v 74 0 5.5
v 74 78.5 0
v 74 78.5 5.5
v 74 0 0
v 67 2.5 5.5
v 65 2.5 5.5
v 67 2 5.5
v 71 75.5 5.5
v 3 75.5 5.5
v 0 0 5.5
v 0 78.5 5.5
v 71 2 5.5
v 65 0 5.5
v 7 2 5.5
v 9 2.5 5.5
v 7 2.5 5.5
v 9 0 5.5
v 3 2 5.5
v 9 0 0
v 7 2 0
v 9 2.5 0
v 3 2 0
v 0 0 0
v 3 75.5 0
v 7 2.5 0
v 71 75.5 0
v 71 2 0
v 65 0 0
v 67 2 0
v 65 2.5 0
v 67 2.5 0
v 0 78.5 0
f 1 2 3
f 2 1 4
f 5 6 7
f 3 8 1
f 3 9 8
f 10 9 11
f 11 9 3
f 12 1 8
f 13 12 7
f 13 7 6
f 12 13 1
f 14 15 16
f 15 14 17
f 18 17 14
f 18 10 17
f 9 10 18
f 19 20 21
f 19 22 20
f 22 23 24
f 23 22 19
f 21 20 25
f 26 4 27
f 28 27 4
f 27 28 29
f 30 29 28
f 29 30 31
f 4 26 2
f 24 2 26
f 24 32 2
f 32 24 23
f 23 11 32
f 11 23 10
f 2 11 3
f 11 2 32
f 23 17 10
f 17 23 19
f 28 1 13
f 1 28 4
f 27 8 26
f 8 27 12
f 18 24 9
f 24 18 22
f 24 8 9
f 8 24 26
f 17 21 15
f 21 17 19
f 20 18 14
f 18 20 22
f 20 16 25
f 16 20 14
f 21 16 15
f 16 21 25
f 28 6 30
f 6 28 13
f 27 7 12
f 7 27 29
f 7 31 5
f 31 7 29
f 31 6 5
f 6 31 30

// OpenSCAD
// Lucas Wilder - Michigan Technological University - EE 4777
// Handle

// Height from bottom of holder to top of handle in mm
handleHeight = 100;

// Number of slides
slides = 15;

actualHeight = handleHeight-21.5;

union()
{
	difference()
	{
		union()
		{
			// Main body
			cube(size = [(4*slides)+14,actualHeight,5.5],
							center = false);
		
		}
	
		// Main cut
		translate([3,-6,0]) 
		cube(size = [(4*slides)+8,actualHeight+3,5.5],
				center = false);	

	}
	
	cube(size = [9,2,5.5]);
	translate([7,0,0]) cube(size = [2,2.5,5.5]);

	translate([(4*slides)+5,0,0])cube(size = [9,2,5.5]);
	translate([(4*slides)+5,0,0]) cube(size = [2,2.5,5.5]);
}
